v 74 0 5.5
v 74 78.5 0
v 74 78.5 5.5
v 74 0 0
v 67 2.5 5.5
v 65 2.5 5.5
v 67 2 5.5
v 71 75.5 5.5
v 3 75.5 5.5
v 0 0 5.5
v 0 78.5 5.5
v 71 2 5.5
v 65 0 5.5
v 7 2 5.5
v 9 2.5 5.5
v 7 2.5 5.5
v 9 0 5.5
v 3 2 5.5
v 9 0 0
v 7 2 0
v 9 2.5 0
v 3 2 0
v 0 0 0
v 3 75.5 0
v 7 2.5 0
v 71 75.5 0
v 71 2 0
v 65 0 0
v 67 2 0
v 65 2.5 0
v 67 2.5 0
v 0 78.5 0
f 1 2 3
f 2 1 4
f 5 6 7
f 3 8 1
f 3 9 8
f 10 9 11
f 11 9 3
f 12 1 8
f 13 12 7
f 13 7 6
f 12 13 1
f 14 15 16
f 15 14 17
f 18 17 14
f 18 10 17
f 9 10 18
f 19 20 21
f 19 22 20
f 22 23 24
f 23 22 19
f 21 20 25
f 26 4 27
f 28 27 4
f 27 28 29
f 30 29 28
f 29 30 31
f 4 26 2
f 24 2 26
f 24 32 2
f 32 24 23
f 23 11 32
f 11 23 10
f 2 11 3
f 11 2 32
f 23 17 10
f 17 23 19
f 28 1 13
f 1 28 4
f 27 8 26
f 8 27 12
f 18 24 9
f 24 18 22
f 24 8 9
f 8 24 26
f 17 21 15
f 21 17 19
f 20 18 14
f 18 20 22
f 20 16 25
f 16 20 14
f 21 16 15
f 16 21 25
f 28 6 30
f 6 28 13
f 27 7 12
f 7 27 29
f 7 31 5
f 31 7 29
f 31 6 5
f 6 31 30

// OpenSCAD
// Lucas Wilder - Michigan Technological University - EE 4777
// Handle

// Height from bottom of holder to top of handle in mm
handleHeight = 100;

// Number of slides
slides = 15;

actualHeight = handleHeight-21.5;

union()
{
	difference()
	{
		union()
		{
			// Main body
			cube(size = [(4*slides)+14,actualHeight,5.5],
							center = false);
		
		}
	
		// Main cut
		translate([3,-6,0]) 
		cube(size = [(4*slides)+8,actualHeight+3,5.5],
				center = false);	

	}
	
	cube(size = [9,2,5.5]);
	translate([7,0,0]) cube(size = [2,2.5,5.5]);

	translate([(4*slides)+5,0,0])cube(size = [9,2,5.5]);
	translate([(4*slides)+5,0,0]) cube(size = [2,2.5,5.5]);
}
